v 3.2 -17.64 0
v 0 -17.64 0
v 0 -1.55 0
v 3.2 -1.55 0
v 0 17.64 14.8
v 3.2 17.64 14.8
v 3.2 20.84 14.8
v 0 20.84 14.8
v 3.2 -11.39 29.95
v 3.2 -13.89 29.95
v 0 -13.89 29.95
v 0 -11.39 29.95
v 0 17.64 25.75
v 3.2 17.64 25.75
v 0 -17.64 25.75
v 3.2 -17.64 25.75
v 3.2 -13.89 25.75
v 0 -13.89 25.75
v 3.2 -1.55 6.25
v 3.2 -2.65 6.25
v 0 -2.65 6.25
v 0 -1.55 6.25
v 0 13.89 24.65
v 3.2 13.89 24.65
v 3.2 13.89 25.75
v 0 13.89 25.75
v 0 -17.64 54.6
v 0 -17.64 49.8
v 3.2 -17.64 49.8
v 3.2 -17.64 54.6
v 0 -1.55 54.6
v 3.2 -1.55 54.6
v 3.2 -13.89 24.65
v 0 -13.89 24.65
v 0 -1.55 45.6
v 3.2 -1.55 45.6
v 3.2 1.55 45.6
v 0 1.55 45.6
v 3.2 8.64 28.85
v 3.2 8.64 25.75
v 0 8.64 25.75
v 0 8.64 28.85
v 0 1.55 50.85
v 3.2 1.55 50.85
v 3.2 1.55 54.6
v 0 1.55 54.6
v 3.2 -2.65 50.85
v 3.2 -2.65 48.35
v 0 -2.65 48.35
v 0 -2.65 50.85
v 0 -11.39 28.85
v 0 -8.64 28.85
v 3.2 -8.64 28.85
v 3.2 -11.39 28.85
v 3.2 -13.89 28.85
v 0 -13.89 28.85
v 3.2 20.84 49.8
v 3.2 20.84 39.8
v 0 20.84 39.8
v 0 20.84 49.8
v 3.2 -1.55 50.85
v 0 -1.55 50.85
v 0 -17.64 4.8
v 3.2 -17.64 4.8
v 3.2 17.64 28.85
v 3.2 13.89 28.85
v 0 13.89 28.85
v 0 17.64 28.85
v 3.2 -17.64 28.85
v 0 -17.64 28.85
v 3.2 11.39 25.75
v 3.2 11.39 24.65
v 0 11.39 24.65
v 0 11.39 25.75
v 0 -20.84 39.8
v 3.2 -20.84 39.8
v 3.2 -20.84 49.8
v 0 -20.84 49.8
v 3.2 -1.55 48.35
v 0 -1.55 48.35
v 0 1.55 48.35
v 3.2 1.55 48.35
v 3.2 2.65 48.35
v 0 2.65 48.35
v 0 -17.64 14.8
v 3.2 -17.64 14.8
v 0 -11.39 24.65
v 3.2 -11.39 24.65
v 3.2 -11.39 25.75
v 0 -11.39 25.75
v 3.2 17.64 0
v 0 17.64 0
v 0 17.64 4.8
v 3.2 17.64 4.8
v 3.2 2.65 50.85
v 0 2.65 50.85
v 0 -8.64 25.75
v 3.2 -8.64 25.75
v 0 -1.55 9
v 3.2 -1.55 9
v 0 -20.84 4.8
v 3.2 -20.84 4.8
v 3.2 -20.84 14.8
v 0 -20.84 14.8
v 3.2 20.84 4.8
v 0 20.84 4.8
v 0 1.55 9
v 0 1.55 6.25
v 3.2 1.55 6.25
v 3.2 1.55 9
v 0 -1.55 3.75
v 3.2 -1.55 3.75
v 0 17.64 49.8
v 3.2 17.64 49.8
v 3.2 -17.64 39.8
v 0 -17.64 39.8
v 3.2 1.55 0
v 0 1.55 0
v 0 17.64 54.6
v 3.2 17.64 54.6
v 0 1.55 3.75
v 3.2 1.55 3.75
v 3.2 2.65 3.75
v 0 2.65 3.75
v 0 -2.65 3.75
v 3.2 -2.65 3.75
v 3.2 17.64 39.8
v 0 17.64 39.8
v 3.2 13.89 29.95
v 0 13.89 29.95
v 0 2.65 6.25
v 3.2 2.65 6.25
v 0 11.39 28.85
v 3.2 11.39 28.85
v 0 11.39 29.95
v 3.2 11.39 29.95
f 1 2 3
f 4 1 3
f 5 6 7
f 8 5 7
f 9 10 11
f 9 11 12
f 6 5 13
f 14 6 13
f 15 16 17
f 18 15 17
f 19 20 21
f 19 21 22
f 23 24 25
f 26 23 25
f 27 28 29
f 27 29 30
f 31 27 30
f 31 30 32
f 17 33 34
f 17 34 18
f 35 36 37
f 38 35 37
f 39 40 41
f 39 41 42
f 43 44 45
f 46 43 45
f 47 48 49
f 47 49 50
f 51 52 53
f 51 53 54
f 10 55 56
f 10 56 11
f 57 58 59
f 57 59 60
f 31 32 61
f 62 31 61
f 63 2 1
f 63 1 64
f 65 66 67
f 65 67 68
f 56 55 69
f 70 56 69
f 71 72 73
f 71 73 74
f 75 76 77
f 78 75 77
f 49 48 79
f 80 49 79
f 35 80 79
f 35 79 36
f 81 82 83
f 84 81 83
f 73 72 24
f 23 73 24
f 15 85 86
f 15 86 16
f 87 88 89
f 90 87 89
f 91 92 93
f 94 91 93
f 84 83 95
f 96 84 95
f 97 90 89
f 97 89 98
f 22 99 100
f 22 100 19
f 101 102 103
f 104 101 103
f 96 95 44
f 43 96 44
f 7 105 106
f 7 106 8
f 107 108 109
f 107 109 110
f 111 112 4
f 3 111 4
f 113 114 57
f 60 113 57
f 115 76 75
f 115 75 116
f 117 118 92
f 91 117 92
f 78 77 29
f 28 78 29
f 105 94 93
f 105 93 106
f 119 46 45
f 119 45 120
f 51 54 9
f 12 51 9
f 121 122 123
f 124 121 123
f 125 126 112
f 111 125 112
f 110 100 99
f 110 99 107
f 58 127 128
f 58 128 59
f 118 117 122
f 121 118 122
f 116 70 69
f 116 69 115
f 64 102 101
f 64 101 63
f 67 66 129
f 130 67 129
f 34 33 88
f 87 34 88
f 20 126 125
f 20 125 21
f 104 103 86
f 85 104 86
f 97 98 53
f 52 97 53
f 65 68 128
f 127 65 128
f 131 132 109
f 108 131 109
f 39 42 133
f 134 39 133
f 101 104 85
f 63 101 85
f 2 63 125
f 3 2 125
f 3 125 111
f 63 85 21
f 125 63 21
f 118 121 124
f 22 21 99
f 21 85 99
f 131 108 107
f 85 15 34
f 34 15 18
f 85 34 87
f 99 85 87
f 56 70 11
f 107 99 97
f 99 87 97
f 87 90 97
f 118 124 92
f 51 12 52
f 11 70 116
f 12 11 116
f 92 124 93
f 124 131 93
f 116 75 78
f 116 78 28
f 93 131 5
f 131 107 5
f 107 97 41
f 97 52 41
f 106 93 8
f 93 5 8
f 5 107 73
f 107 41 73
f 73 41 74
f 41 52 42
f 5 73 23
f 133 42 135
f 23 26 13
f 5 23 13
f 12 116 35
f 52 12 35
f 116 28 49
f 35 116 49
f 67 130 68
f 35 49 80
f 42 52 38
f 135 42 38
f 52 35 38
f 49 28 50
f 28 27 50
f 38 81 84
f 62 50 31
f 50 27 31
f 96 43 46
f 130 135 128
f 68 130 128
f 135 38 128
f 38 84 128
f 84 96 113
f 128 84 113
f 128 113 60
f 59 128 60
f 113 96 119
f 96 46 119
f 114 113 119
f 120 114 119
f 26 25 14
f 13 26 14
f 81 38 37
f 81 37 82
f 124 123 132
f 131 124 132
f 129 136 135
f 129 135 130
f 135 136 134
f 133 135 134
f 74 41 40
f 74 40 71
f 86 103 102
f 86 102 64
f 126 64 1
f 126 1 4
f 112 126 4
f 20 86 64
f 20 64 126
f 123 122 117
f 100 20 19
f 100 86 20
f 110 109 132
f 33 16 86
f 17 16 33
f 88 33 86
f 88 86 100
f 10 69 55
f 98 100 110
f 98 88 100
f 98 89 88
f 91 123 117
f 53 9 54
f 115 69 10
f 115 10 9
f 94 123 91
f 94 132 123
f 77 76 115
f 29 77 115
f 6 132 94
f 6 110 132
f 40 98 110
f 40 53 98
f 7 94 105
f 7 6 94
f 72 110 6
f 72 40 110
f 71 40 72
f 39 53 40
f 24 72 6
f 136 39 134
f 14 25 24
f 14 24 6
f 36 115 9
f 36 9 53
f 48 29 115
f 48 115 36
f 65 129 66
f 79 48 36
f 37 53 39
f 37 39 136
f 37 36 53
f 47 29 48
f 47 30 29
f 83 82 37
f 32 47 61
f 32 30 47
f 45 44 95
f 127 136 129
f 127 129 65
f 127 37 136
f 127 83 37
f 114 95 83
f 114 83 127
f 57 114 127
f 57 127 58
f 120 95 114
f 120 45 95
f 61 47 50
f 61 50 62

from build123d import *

# Parameters (mm, degrees)
F1_W     = 35.28
F1_H     = 54.6
F2_DEPTH = 3.2
F3_W     = 3.2
F3_H     = 10
F4_DEPTH = 3.2
F5_W     = 3.1
F5_H     = 3.75
F5_H_2   = 2.5
F5_W_2   = 1.1
F5_H_3   = 2.75
F5_W_3   = 3.75
F5_H_4   = 3.1
F5_W_4   = 2.5
F5_H_5   = 1.1
F5_W_5   = 2.75
F6_DEPTH = 3.201


with BuildPart() as f2:
    # F1 (on Right) → F2 (new body)
    with BuildSketch(Plane.YZ):
        with Locations((0, 27.3)):
            Rectangle(F1_W, F1_H)
    extrude(amount=F2_DEPTH)

    # F3 (on face) → F4 (join, through all)
    with BuildSketch(Plane.YZ.offset(3.2)):
        with Locations((-19.24, 44.8)):
            Rectangle(F3_W, F3_H)
        with Locations((-19.24, 9.8)):
            Rectangle(F3_W, F3_H)
        with Locations((19.24, 9.8)):
            Rectangle(F3_W, F3_H)
        with Locations((19.24, 44.8)):
            Rectangle(F3_W, F3_H)
    extrude(amount=-F4_DEPTH)

    # F5 (on face) → F6 (cut, through all)
    with BuildSketch(Plane.YZ.offset(3.2)):
        with Locations((0, 1.875)):
            Rectangle(F5_W, F5_H)
        with Locations((0, 5)):
            Rectangle(F5_W, F5_H_2)
        with Locations((2.1, 5)):
            Rectangle(F5_W_2, F5_H_2)
        with Locations((0, 7.625)):
            Rectangle(F5_W, F5_H_3)
        with Locations((-2.1, 5)):
            Rectangle(F5_W_2, F5_H_2)
        with Locations((-15.765, 27.3)):
            Rectangle(F5_W_3, F5_H_4)
        with Locations((-12.64, 27.3)):
            Rectangle(F5_W_4, F5_H_4)
        with Locations((-12.64, 25.2)):
            Rectangle(F5_W_4, F5_H_5)
        with Locations((-10.015, 27.3)):
            Rectangle(F5_W_5, F5_H_4)
        with Locations((-12.64, 29.4)):
            Rectangle(F5_W_4, F5_H_5)
        with Locations((12.64, 29.4)):
            Rectangle(F5_W_4, F5_H_5)
        with Locations((12.64, 27.3)):
            Rectangle(F5_W_4, F5_H_4)
        with Locations((10.015, 27.3)):
            Rectangle(F5_W_5, F5_H_4)
        with Locations((15.765, 27.3)):
            Rectangle(F5_W_3, F5_H_4)
        with Locations((12.64, 25.2)):
            Rectangle(F5_W_4, F5_H_5)
        with Locations((2.1, 49.6)):
            Rectangle(F5_W_2, F5_H_2)
        with Locations((0, 46.975)):
            Rectangle(F5_W, F5_H_3)
        with Locations((0, 49.6)):
            Rectangle(F5_W, F5_H_2)
        with Locations((0, 52.725)):
            Rectangle(F5_W, F5_H)
        with Locations((-2.1, 49.6)):
            Rectangle(F5_W_2, F5_H_2)
    extrude(amount=-F6_DEPTH, mode=Mode.SUBTRACT)


solid = f2.part
